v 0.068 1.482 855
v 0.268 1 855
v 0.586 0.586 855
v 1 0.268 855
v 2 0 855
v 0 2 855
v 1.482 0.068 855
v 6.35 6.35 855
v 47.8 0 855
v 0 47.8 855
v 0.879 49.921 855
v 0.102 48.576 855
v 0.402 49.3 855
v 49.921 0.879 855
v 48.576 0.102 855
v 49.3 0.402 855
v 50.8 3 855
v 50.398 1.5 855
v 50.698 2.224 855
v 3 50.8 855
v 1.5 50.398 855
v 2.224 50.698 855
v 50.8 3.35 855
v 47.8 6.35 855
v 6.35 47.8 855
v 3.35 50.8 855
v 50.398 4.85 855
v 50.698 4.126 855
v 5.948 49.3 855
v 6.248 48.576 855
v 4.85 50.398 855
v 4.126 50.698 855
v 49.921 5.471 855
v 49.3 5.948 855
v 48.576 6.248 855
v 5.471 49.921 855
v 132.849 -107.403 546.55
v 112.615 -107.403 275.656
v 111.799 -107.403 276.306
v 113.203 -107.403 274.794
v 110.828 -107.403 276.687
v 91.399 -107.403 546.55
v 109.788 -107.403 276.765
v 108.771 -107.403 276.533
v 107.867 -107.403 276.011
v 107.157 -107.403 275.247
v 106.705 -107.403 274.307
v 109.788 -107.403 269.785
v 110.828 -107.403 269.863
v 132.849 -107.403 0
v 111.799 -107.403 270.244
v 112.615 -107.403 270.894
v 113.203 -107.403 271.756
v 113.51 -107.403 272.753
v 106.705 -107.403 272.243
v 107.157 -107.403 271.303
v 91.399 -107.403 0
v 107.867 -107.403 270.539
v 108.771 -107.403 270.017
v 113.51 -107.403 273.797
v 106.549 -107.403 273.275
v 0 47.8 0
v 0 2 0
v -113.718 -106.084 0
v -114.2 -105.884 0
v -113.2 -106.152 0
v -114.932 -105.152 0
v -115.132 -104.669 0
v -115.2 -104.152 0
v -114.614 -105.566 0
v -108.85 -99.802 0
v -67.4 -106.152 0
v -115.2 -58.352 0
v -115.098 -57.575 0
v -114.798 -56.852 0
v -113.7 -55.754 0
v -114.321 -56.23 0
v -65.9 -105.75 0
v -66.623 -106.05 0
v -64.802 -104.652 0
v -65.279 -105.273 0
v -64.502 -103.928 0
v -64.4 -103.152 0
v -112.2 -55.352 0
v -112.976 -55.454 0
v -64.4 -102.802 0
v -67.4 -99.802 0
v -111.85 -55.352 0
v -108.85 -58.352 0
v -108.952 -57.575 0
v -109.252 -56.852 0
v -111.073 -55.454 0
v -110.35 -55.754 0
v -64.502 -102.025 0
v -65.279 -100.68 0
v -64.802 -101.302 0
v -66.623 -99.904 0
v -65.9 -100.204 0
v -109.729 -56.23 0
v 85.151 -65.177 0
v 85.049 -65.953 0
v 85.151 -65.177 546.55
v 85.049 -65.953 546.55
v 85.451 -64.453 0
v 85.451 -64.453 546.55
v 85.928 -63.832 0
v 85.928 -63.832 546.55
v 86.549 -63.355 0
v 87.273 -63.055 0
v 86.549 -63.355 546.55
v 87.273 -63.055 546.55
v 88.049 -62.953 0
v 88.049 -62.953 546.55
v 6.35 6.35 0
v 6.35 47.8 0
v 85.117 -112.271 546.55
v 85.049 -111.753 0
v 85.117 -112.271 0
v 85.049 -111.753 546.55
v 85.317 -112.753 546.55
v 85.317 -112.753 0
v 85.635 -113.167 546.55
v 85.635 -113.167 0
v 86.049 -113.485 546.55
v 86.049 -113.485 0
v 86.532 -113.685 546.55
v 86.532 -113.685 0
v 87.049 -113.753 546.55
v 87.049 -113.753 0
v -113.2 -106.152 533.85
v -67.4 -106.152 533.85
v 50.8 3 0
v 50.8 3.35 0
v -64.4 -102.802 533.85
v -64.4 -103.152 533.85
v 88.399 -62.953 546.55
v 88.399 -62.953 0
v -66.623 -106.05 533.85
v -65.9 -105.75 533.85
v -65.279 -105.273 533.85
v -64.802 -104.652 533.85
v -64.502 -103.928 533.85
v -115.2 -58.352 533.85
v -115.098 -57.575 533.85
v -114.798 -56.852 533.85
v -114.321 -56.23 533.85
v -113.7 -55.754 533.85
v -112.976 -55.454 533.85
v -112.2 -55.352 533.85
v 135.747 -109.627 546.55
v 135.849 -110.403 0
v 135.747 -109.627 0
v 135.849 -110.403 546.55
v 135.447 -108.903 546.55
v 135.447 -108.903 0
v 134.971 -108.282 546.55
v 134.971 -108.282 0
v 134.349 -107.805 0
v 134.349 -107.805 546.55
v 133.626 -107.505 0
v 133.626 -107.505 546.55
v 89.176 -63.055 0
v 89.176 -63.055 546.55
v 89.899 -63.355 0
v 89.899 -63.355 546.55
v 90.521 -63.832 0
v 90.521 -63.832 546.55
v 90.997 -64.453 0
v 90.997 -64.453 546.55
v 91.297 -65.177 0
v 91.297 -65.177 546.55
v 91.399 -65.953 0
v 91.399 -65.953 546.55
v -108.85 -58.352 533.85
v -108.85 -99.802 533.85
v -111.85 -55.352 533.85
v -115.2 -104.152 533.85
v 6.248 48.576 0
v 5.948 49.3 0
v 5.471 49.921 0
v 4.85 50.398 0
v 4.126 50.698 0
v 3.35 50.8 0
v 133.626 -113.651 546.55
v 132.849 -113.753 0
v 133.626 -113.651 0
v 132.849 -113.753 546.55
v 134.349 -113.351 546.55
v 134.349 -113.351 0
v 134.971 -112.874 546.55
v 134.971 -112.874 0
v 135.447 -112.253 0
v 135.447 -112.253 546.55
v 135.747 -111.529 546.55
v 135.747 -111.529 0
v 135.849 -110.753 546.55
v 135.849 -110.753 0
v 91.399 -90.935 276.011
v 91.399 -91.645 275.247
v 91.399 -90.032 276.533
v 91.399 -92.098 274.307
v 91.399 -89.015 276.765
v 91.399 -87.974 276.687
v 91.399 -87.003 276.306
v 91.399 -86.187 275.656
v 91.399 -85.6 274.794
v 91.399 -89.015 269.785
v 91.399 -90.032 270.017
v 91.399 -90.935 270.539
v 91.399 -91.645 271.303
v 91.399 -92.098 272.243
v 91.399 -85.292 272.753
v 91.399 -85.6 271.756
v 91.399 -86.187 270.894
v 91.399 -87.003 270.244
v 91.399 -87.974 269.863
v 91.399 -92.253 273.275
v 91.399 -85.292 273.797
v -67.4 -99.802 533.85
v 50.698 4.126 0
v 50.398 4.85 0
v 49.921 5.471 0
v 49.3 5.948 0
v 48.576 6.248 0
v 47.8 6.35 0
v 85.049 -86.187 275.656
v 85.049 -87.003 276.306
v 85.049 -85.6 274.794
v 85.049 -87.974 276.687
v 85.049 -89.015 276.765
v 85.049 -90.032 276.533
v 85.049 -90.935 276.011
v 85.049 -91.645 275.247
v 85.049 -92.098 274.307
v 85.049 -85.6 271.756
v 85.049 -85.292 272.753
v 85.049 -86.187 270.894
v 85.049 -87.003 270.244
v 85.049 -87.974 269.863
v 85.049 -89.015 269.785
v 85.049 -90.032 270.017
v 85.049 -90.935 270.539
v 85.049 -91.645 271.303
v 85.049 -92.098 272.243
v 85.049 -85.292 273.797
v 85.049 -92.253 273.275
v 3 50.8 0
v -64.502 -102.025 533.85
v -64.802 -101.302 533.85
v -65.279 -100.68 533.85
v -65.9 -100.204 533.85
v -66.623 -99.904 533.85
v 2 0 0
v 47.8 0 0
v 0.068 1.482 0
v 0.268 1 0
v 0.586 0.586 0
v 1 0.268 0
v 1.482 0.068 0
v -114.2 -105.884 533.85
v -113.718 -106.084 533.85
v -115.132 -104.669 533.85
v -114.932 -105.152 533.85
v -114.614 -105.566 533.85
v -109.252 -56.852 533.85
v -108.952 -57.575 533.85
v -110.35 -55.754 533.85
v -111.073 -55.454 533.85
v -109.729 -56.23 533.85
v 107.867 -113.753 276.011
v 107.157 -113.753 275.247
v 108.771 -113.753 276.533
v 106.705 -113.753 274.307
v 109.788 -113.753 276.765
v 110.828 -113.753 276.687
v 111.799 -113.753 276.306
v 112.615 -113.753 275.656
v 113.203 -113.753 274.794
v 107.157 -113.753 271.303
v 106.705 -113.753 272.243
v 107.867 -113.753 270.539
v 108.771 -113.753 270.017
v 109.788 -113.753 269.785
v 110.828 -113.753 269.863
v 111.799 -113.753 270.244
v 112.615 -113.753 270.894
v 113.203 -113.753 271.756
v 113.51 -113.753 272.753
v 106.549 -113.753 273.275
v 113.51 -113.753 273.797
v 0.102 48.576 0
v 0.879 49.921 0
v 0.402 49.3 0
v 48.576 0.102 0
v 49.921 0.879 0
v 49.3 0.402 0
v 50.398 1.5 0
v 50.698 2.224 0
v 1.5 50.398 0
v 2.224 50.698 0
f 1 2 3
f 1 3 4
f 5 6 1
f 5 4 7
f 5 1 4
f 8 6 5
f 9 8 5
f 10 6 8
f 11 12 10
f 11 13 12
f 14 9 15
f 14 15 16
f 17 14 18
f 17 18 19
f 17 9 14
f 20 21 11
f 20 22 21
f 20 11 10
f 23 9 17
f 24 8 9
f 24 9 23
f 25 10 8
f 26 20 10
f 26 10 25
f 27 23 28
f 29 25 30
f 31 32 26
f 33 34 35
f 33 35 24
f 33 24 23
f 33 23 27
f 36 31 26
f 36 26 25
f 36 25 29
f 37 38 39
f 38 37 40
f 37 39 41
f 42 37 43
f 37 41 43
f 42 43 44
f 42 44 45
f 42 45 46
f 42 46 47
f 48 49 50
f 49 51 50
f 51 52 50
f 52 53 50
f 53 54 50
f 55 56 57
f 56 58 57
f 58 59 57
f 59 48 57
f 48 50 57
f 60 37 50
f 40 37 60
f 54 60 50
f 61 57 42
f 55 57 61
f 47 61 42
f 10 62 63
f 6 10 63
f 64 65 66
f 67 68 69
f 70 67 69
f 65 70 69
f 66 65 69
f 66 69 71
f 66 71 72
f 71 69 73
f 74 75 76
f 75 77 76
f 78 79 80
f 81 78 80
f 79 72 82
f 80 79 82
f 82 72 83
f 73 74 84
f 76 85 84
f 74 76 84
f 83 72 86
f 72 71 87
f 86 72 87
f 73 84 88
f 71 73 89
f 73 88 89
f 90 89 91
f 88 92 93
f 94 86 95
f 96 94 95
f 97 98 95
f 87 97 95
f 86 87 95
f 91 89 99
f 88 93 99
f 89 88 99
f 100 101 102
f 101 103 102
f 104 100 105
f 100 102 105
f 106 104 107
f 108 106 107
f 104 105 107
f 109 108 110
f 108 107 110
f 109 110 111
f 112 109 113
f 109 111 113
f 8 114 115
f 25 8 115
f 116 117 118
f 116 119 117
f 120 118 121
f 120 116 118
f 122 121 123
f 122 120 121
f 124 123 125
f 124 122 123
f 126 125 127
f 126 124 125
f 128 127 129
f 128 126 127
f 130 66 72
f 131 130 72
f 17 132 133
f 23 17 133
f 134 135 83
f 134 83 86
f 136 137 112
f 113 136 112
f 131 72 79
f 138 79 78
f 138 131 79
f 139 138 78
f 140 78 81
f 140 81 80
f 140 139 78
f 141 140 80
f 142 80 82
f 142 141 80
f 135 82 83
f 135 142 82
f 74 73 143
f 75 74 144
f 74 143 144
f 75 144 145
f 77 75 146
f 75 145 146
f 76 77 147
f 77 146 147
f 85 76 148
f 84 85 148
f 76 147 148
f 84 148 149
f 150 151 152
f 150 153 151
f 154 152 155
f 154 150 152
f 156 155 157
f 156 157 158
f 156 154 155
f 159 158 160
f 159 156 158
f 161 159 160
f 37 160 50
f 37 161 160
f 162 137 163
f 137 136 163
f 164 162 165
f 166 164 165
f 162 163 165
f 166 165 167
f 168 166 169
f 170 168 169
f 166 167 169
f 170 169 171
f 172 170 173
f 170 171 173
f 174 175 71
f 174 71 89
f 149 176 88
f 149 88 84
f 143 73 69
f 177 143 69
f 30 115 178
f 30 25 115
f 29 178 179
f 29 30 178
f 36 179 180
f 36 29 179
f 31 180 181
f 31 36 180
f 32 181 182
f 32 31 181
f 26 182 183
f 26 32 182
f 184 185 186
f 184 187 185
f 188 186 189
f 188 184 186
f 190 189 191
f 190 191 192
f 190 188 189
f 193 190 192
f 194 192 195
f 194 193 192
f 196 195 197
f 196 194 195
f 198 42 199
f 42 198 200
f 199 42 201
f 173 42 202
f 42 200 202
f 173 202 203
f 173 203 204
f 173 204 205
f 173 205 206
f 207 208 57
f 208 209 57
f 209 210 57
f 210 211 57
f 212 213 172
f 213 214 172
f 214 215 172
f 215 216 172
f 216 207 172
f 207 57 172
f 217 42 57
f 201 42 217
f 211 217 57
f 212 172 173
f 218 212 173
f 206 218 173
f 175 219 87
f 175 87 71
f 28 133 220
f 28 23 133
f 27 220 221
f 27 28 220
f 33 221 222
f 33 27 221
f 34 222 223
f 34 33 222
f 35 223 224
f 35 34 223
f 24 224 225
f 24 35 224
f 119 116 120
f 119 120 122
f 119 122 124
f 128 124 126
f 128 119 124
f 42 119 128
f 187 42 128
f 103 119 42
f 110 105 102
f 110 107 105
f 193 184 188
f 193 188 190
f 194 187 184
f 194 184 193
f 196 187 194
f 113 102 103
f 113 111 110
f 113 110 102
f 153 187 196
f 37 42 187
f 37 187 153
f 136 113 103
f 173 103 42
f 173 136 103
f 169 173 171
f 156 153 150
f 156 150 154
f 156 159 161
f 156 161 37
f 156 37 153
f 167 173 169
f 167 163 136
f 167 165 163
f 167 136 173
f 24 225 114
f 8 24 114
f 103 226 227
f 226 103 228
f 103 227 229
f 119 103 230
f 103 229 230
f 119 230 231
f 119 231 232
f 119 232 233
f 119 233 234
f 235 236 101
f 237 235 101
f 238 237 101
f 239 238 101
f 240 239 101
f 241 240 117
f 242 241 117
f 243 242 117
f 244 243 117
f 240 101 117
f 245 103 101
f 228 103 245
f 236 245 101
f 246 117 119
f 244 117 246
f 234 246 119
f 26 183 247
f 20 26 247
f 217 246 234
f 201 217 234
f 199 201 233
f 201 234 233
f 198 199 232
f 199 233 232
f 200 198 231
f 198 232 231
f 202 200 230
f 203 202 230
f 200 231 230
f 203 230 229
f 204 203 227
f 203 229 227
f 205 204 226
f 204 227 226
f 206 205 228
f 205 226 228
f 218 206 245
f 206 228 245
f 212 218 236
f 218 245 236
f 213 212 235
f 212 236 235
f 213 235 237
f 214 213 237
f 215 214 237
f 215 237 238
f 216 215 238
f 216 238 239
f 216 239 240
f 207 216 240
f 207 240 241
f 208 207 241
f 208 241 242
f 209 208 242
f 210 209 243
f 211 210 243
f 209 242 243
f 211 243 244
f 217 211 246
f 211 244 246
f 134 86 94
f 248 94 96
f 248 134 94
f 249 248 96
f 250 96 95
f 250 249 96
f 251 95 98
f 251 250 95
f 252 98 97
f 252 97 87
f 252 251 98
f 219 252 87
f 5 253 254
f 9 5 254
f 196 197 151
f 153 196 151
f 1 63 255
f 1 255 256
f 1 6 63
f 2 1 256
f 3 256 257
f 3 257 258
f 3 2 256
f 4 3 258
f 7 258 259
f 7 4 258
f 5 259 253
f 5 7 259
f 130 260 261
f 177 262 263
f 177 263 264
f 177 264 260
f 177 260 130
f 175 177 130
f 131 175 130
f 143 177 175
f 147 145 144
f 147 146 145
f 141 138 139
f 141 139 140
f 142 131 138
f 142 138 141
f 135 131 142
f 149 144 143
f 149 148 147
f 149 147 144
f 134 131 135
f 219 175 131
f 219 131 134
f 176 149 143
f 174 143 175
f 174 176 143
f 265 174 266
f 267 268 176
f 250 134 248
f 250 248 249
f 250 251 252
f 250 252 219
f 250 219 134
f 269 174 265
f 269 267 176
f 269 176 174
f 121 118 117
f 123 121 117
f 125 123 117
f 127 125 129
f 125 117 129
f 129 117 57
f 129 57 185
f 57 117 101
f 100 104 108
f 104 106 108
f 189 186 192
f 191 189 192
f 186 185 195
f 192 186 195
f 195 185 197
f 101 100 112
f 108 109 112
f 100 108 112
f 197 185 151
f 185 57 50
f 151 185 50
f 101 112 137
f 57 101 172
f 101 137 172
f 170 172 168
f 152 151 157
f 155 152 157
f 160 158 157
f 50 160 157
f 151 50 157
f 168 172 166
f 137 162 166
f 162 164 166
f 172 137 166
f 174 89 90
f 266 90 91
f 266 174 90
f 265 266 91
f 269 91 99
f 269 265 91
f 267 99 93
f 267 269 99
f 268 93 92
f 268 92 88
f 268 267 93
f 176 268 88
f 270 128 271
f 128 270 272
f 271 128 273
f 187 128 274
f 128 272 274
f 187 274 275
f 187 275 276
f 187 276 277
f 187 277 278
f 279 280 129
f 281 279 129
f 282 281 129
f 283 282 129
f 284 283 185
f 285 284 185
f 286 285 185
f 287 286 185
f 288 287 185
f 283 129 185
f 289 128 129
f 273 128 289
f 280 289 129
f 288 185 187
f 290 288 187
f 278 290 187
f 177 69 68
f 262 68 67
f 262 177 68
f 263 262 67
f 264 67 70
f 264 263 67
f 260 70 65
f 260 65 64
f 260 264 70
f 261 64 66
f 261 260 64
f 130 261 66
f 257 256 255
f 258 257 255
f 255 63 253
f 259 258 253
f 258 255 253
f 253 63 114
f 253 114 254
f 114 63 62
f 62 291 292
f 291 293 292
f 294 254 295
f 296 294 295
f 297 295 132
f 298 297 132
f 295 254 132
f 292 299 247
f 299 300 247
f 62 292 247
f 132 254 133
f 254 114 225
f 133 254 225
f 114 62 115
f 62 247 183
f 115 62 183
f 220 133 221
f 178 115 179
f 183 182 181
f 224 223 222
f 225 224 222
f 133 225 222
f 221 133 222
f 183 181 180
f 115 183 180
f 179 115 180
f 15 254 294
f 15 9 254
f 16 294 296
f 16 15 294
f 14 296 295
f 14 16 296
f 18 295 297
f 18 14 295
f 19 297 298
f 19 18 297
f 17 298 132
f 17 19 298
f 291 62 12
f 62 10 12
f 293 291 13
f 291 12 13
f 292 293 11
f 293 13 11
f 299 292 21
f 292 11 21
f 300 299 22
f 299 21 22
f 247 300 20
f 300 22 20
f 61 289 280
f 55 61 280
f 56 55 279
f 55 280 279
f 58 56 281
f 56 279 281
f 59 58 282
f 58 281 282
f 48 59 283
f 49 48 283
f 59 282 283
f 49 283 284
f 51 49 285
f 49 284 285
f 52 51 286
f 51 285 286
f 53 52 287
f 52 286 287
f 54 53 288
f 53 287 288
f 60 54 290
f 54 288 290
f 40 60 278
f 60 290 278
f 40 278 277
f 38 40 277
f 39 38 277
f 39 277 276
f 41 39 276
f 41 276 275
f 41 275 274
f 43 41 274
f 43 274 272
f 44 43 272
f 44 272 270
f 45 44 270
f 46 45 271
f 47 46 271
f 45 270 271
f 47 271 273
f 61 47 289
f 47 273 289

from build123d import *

# Parameters (mm, degrees)
F1_DEPTH = 855
F2_DEPTH = 546.55
F3_DEPTH = 533.85
F4_R     = 3.5
F5_DEPTH = 6.35
F7_DEPTH = 6.35
F8_R     = 3
F8_2_R   = 3
F8_3_R   = 3
F9_R     = 2
F9_2_R   = 2
F9_3_R   = 2


with BuildPart() as f1:
    # F0 (on Top) → F1 (new body)
    with BuildSketch(Plane.XY):
        Polygon((0, 50.8), (0, 0), (50.8, 0), (50.8, 6.35), (6.35, 6.35), (6.35, 50.8), align=None)
    extrude(amount=F1_DEPTH)

    # F8#3
    f8_3_edges = [f1.edges().sort_by_distance(p)[0] for p in [
        (6.35, 50.8, 427.5),
        (0, 50.8, 427.5),
        (50.8, 6.35, 427.5),
        (50.8, 0, 427.5),
    ]]
    fillet(f8_3_edges, radius=F8_3_R)

    # F9#3
    f9_3_edges = [f1.edges().sort_by_distance(p)[0] for p in [
        (0, 0, 427.5),
    ]]
    fillet(f9_3_edges, radius=F9_3_R)


with BuildPart() as f2:
    # F0 (on Top) → F2 (new body)
    with BuildSketch(Plane.XY):
        Polygon((85.049236, -62.953019), (85.049236, -113.753019), (135.849236, -113.753019), (135.849236, -107.403019), (91.399236, -107.403019), (91.399236, -62.953019), align=None)
    extrude(amount=F2_DEPTH)

    # F4 (on face) → F5 (cut, through all)
    with BuildSketch(Plane(origin=(85.049236, 0, 0), x_dir=(0, -1, 0), z_dir=(-1, 0, 0))):
        with Locations((88.753019, 273.275)):
            Circle(F4_R)
    extrude(amount=-F5_DEPTH, mode=Mode.SUBTRACT)

    # F6 (on face) → F7 (cut, through all)
    with BuildSketch(Plane.XZ.offset(113.753019)):
        with BuildLine():
            ThreePointArc((113.549236, 273.275), (110.049236, 276.775), (106.549236, 273.275))
            ThreePointArc((106.549236, 273.275), (110.049236, 269.775), (113.549236, 273.275))
        make_face()
    extrude(amount=-F7_DEPTH, mode=Mode.SUBTRACT)

    # F8#2
    f8_2_edges = [f2.edges().sort_by_distance(p)[0] for p in [
        (135.849236, -113.753019, 273.275),
        (85.049236, -62.953019, 273.275),
        (91.399236, -62.953019, 273.275),
        (135.849236, -107.403019, 273.275),
    ]]
    fillet(f8_2_edges, radius=F8_2_R)

    # F9#2
    f9_2_edges = [f2.edges().sort_by_distance(p)[0] for p in [
        (85.049236, -113.753019, 273.275),
    ]]
    fillet(f9_2_edges, radius=F9_2_R)


with BuildPart() as f3:
    # F0 (on Top) → F3 (new body)
    with BuildSketch(Plane.XY):
        Polygon((-115.199921, -55.351787), (-115.199921, -106.151787), (-64.399921, -106.151787), (-64.399921, -99.801787), (-108.849921, -99.801787), (-108.849921, -55.351787), align=None)
    extrude(amount=F3_DEPTH)

    # F8
    f8_edges = [f3.edges().sort_by_distance(p)[0] for p in [
        (-64.399921, -106.151787, 266.925),
        (-64.399921, -99.801787, 266.925),
        (-108.849921, -55.351787, 266.925),
        (-115.199921, -55.351787, 266.925),
    ]]
    fillet(f8_edges, radius=F8_R)

    # F9
    f9_edges = [f3.edges().sort_by_distance(p)[0] for p in [
        (-115.199921, -106.151787, 266.925),
    ]]
    fillet(f9_edges, radius=F9_R)


solid = Compound([f1.part, f2.part, f3.part])
